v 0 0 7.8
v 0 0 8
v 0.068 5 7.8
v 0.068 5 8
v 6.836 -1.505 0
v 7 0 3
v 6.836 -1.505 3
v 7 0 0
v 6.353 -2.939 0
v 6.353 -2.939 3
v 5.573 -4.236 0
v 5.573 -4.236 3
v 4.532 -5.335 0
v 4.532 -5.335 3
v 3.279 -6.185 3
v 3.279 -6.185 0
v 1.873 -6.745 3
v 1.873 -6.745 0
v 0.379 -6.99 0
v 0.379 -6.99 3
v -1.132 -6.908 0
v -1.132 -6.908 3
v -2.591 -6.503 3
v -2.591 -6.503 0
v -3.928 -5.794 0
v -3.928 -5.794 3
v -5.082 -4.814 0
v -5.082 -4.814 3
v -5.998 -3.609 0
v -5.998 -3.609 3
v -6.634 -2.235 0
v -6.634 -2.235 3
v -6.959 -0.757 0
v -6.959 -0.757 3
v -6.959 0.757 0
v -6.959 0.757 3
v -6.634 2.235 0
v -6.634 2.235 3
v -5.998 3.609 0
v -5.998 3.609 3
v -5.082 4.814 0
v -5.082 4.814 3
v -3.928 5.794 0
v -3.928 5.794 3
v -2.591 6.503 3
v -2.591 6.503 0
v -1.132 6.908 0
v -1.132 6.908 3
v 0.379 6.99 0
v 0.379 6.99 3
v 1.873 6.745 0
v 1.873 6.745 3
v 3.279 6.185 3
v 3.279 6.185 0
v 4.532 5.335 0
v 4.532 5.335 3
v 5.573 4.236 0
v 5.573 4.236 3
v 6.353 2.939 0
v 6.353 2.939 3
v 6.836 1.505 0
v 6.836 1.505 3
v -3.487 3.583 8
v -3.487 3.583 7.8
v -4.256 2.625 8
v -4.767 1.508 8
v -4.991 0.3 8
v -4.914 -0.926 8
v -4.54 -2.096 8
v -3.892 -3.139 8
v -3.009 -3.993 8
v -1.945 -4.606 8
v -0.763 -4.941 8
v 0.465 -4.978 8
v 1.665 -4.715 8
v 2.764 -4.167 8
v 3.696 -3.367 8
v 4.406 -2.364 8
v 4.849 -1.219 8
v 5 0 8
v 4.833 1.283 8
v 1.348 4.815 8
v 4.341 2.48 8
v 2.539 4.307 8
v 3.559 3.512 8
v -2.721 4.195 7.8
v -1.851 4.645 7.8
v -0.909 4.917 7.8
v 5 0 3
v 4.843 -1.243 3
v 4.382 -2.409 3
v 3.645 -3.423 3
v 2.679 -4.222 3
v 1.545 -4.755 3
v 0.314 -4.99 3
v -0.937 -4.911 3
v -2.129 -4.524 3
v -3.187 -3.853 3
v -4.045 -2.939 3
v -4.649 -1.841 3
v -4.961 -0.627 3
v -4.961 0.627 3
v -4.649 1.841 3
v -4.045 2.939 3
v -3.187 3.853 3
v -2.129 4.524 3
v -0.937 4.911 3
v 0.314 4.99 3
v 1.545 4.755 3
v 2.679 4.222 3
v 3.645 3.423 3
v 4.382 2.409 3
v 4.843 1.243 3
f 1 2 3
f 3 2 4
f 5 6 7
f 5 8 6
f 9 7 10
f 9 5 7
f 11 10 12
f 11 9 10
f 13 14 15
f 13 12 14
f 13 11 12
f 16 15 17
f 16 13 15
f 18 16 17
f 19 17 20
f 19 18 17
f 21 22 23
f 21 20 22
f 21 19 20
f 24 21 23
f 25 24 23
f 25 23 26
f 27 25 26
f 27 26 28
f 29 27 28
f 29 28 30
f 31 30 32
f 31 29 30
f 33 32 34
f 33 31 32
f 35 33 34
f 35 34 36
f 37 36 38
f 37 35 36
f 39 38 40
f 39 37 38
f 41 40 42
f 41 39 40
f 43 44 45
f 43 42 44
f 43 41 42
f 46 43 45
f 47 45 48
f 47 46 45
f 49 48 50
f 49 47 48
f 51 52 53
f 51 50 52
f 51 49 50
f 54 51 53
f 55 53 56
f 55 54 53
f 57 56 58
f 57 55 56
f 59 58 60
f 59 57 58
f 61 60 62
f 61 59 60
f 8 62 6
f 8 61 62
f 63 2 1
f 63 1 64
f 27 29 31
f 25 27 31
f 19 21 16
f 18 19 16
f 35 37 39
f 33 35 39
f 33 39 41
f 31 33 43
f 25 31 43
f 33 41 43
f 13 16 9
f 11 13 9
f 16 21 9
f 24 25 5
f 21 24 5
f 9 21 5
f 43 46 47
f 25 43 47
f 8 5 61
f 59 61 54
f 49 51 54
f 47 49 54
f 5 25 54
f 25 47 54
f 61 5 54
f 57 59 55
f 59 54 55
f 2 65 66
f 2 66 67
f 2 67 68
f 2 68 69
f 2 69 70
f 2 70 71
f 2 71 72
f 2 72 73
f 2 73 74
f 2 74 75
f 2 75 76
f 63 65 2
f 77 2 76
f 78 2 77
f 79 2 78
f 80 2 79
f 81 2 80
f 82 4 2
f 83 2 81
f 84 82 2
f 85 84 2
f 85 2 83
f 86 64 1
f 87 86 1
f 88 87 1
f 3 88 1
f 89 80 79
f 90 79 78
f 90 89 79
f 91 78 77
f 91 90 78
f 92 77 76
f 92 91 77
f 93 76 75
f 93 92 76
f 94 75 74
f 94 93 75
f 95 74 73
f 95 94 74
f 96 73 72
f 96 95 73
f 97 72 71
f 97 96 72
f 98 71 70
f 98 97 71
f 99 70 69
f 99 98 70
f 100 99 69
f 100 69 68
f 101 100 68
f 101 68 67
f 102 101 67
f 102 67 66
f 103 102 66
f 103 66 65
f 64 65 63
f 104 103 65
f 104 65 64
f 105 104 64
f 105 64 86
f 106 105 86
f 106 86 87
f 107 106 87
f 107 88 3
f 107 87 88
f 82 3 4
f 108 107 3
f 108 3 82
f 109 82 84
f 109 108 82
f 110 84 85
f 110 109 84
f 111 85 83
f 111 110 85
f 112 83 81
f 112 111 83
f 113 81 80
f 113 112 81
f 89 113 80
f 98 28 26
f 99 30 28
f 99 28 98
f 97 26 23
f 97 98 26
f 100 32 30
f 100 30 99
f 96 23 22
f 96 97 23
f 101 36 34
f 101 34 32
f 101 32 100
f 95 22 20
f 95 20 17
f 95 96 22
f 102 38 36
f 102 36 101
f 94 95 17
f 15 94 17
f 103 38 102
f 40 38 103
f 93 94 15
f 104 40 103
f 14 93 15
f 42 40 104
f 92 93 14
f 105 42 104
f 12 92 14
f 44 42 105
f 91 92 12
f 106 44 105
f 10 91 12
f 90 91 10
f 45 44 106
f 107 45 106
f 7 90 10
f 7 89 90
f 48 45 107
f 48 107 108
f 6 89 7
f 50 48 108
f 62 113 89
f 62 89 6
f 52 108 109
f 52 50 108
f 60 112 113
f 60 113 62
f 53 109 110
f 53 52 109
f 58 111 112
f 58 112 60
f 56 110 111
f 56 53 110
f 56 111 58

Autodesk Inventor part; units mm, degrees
ref_plane "YZ Plane" through (0, 0, 0) normal (1, 0, 0) x (0, 1, 0)
ref_plane "XZ Plane" through (0, 0, 0) normal (0, 1, 0) x (-1, 0, 0)
ref_plane "XY Plane" through (0, 0, 0) normal (0, 0, 1) x (1, 0, 0)
sketch "Sketch1" plane through (0, 0, 0) normal (0, 0, 1) x (1, 0, 0)
  circle A0 centre (0, 0) radius 7
  dimension "d0" = 14
extrude "Extrusion1" add sketch "Sketch1" along normal blind 3
sketch "Sketch2" plane through (0, 0, 3) normal (0, 0, 1) x (1, 0, 0)
  circle A0 centre (0, 0) radius 5
  dimension "d3" = 10
extrude "Extrusion2" add sketch "Sketch2" along normal blind 5
sketch "Sketch3" plane through (0, 0, 8) normal (0, 0, 1) x (1, 0, 0)
  circle A0 centre (0, 0) radius 5 projected
  arc A1 (0.0676, 4.9995) -> (-3.4874, 3.583) centre (0, 0) ccw
  line L0 (0, 0) -> (0.0676, 4.9995)
  line L1 (0, 0) -> (-3.4874, 3.583)
  dimension "d6" = 45
extrude "Extrusion3" cut sketch "Sketch3" against normal blind 0.2 contours L0 L1 A0 picked at (-0.9199, 3.1872)
properties part number "potentiometer knob"
